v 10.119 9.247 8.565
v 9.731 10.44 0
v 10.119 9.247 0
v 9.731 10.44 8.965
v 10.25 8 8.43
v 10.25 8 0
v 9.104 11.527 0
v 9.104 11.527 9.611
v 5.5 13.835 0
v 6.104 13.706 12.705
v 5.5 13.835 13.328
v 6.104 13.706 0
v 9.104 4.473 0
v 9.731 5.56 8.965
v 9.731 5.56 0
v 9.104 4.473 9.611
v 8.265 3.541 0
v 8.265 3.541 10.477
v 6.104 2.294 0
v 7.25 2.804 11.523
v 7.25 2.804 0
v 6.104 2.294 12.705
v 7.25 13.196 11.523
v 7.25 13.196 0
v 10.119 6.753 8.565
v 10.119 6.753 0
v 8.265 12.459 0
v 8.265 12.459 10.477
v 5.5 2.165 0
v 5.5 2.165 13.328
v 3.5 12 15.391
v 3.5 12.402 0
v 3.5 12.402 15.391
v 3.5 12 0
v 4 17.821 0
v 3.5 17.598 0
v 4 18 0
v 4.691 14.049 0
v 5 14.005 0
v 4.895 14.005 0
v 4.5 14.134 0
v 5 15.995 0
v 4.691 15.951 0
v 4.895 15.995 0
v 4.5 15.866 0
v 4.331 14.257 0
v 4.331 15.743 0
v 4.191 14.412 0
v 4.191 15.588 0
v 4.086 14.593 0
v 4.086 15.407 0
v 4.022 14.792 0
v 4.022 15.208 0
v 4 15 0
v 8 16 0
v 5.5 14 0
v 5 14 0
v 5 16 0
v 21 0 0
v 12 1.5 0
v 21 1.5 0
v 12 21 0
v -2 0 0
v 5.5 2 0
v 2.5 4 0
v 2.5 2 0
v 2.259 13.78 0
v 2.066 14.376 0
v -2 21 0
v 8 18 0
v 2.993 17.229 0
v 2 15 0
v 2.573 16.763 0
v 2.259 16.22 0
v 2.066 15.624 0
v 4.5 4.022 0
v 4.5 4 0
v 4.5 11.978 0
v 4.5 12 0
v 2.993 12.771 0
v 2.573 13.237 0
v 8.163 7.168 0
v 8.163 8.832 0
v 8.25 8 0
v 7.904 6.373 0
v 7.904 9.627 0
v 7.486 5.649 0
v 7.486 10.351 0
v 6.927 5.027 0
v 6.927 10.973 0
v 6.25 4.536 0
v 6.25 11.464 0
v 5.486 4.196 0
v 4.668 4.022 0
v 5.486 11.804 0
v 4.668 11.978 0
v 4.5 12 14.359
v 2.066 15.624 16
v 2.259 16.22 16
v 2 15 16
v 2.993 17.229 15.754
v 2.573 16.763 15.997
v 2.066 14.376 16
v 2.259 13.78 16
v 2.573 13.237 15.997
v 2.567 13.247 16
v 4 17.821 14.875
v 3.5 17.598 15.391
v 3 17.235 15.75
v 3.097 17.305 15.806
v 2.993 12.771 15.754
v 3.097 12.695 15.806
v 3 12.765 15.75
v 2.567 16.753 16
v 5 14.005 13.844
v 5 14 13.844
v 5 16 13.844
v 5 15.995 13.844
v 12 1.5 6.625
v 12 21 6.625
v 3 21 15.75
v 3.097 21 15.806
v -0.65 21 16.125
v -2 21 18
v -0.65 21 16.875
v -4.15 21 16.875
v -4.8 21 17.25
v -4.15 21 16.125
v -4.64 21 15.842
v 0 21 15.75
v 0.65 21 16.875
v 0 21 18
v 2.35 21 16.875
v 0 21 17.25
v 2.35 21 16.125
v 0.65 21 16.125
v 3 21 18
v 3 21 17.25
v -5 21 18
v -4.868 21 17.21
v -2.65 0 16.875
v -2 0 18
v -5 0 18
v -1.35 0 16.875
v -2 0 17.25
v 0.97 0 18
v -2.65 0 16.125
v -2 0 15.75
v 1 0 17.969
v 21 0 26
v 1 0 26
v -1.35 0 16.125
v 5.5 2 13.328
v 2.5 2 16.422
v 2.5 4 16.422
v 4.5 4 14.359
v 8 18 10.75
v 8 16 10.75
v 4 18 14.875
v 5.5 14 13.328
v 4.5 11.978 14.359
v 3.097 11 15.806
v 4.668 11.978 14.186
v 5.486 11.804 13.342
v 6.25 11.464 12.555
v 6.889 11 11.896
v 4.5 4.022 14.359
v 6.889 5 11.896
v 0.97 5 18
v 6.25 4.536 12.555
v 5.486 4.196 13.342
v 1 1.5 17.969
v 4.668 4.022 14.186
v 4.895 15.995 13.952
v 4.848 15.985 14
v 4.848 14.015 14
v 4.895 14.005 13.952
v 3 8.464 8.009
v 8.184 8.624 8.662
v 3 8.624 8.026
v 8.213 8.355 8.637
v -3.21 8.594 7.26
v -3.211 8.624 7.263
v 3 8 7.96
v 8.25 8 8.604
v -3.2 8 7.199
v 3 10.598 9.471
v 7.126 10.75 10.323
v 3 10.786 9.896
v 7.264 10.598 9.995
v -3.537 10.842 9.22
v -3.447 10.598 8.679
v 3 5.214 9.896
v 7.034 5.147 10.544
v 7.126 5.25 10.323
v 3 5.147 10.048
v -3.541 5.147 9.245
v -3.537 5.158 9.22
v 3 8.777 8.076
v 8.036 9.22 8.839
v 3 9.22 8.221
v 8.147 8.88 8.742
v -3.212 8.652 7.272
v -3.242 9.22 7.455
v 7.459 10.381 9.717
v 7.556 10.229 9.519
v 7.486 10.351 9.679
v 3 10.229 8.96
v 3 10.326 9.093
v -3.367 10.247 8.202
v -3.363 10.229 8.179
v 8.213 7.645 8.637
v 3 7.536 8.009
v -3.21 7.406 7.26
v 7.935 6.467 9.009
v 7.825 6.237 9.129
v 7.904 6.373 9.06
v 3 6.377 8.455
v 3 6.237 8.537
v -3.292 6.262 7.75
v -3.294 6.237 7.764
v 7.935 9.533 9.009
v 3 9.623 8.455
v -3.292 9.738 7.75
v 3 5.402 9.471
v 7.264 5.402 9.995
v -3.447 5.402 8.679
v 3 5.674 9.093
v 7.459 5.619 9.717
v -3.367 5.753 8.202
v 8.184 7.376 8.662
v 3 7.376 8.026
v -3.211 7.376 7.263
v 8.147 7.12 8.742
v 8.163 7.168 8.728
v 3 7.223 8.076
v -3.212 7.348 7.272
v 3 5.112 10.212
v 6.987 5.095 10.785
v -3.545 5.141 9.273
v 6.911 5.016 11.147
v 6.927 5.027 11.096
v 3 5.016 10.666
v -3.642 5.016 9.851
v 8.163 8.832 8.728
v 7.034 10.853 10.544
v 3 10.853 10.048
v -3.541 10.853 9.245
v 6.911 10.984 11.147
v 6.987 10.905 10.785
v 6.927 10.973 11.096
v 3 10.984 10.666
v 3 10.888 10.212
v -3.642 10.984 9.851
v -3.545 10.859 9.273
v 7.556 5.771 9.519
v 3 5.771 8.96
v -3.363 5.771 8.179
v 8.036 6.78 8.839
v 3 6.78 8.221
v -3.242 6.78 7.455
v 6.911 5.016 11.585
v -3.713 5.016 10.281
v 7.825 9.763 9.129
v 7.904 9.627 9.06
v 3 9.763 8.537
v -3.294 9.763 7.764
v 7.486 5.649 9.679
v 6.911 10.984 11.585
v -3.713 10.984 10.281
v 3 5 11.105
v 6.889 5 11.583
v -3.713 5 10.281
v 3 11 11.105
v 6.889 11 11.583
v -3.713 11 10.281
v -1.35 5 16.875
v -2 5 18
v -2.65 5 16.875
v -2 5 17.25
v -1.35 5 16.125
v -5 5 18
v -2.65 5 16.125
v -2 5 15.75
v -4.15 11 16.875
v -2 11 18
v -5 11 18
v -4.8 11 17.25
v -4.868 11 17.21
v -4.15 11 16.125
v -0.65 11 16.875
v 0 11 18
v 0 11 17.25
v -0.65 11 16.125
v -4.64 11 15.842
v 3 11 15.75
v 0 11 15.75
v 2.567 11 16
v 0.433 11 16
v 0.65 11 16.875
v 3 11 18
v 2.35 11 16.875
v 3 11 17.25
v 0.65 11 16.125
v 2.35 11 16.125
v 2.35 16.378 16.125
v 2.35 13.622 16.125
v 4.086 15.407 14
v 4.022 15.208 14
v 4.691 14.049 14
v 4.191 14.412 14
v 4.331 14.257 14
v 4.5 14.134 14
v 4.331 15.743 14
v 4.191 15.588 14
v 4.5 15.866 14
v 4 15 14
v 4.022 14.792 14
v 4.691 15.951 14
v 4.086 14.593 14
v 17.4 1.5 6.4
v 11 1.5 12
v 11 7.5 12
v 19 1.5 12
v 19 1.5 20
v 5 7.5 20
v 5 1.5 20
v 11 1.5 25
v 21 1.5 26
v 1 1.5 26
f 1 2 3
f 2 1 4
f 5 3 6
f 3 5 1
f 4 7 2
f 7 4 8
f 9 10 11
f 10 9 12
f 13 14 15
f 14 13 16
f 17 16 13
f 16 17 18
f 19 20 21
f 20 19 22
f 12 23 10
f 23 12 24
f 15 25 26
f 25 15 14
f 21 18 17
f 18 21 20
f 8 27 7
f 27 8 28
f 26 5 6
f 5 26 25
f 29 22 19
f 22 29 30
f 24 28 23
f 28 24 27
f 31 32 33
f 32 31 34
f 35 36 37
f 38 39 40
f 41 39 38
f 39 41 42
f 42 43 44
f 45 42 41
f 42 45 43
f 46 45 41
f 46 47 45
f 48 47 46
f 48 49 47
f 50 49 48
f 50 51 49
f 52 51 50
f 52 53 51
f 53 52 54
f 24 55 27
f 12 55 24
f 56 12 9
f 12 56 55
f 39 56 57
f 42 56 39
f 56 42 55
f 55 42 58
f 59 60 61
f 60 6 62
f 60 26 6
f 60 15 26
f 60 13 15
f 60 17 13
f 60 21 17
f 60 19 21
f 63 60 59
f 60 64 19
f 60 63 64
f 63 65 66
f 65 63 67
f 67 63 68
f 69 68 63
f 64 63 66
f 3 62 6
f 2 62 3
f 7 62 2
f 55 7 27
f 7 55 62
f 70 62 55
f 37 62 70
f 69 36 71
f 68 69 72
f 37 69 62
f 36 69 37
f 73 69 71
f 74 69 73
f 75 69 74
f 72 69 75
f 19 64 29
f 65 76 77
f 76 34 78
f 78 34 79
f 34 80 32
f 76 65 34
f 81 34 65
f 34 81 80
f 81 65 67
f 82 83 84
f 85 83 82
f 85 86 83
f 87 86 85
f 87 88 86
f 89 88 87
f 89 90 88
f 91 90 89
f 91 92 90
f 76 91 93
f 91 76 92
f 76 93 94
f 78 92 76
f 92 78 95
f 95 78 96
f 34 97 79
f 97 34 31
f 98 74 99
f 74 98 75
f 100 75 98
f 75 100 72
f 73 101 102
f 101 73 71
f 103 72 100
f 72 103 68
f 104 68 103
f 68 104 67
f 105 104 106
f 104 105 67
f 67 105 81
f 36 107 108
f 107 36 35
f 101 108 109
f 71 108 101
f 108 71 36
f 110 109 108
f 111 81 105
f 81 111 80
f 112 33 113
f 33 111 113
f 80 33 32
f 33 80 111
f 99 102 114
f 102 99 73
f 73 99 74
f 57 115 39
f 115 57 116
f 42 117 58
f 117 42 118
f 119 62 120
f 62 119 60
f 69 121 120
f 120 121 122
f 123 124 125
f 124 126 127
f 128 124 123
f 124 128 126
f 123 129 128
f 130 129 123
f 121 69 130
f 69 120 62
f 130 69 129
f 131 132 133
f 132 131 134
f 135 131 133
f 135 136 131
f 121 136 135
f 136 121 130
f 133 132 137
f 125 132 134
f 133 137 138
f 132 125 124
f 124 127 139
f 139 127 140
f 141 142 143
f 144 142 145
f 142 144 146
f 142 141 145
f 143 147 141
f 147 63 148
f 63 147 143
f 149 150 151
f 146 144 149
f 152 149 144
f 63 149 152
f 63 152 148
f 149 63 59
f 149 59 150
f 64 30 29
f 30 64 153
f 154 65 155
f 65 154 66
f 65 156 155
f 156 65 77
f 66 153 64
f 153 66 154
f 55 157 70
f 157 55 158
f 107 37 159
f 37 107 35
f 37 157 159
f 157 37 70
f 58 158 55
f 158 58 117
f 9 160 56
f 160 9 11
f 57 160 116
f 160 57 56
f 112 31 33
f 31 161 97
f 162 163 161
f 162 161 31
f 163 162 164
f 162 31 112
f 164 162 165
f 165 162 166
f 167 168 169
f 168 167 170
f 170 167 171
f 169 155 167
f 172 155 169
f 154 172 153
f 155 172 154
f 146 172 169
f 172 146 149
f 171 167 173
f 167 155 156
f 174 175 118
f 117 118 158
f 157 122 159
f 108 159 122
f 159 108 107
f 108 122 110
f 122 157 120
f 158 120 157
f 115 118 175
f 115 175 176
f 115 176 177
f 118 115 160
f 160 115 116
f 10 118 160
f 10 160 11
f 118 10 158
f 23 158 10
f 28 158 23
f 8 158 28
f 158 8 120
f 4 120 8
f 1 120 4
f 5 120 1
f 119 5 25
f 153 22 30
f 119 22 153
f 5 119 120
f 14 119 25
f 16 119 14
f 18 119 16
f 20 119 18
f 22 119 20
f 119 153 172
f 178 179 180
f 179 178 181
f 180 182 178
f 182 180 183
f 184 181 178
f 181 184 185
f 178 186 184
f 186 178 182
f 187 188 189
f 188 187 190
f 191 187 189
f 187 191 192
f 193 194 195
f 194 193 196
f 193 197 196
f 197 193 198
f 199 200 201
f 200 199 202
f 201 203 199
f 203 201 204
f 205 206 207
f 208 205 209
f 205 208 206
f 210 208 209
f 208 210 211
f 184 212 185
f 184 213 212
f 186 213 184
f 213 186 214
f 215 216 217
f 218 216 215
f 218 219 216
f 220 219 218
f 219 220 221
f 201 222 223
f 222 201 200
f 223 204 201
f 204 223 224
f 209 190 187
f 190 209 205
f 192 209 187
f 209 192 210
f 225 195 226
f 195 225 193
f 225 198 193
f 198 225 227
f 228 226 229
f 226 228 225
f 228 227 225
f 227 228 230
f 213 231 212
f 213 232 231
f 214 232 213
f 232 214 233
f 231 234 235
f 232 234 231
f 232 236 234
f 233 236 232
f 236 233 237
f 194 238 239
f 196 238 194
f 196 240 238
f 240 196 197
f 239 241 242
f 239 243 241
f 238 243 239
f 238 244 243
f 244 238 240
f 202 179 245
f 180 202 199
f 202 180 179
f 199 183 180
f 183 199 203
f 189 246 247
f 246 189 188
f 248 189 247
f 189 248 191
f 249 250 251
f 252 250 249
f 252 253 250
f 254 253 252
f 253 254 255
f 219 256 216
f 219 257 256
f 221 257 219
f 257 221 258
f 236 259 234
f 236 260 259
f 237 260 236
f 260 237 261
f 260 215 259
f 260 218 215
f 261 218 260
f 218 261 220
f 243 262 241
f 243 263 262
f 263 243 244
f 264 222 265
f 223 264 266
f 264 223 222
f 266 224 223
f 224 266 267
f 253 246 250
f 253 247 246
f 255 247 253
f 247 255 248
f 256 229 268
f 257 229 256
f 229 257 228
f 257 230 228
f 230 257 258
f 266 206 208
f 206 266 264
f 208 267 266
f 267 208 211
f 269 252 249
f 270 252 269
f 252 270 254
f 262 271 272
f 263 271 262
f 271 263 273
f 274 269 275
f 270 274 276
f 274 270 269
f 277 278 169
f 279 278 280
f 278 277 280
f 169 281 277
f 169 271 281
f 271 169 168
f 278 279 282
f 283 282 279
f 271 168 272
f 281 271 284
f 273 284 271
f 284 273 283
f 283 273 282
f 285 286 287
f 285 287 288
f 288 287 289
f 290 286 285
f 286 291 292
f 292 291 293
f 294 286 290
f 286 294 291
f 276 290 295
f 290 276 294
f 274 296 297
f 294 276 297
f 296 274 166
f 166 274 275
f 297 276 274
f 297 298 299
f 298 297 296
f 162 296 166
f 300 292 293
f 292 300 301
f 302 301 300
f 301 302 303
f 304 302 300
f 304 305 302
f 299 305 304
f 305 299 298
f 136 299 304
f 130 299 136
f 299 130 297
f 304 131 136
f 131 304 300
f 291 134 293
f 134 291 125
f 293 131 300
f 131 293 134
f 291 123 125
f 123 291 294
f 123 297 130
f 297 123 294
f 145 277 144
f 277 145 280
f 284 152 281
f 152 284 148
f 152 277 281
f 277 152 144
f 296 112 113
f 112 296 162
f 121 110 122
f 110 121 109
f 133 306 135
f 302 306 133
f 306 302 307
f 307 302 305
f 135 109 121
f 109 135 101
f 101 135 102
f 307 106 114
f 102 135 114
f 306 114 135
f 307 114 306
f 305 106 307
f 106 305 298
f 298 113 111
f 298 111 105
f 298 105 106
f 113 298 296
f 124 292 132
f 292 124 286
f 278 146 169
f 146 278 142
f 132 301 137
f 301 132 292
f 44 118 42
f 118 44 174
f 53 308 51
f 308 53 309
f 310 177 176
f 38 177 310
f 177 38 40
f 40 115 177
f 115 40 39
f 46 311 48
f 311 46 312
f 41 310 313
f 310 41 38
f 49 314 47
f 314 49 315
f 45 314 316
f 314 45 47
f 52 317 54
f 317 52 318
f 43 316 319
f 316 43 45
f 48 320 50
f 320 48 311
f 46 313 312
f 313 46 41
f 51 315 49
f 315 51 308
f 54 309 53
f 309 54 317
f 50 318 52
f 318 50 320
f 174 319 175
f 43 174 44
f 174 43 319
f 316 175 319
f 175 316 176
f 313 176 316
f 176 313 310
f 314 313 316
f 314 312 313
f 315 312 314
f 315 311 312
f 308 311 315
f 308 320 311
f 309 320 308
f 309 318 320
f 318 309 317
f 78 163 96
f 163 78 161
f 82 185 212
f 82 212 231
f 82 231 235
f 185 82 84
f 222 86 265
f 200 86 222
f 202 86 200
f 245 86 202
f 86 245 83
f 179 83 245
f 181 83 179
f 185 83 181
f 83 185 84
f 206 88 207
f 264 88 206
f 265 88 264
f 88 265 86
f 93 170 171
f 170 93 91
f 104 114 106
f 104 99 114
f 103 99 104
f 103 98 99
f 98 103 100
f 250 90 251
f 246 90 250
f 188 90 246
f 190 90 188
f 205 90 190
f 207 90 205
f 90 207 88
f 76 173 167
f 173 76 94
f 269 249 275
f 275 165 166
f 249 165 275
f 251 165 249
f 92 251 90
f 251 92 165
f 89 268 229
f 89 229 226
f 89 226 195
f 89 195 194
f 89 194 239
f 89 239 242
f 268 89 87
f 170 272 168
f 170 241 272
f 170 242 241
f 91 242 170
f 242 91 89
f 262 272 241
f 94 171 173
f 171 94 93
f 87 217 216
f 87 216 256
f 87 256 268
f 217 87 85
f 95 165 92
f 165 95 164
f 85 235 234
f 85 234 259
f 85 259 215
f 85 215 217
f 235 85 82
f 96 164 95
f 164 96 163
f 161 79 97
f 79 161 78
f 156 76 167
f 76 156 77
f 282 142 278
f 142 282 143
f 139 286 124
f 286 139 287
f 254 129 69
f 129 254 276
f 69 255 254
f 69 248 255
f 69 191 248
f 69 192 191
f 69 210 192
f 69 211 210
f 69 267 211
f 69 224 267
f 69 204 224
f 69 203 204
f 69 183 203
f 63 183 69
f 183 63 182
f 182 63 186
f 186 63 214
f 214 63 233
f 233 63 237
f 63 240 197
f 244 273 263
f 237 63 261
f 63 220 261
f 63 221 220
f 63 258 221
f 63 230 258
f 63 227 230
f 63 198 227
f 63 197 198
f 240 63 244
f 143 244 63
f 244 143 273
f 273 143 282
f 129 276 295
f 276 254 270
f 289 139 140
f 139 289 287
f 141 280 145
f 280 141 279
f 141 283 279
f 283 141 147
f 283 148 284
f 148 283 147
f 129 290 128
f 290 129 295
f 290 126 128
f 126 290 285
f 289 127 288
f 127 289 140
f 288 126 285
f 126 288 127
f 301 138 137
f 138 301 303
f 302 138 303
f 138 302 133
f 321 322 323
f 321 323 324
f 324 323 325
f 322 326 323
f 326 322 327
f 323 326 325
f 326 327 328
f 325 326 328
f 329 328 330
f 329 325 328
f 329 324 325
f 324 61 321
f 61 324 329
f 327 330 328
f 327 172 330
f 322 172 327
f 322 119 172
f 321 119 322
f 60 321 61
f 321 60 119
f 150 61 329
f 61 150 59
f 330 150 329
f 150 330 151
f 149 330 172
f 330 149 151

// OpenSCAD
// band width[mm]
nauhanleveys = 24; // [24:1:39]
// underplate width[mm] 
alalevyn_leveys =26; // [26:1:39]
//underplate legth[mm]
alalevyn_pituus =20; // [18:1:39]

$fn = 30;

CubePoints = [  // viiste
  [  0,  -1,  19 ],  //0
  [ 32,  -1,  -14 ],  //1
  [ 32,  25,  -14 ],  //2
  [  0,  25,  19 ],  //3
  [  0,  -1,  50 ],  //4
  [ 32,  -1,  50 ],  //5
  [ 32,  25,  50 ],  //6
  [  0,  25,  50 ]]; //7
  
CubeFaces = [
  [0,1,2,3],  // bottom
  [4,5,1,0],  // front
  [7,6,5,4],  // top
  [5,6,2,1],  // right
  [6,7,3,2],  // back
  [7,4,0,3]]; // left
  
 

  difference(){
translate([-2,0,0])
cube([16+nauhanleveys/3-10,21,25],false); //alkupalikka
      
translate([2.5,2,0]) // alinrako
cube([5+nauhanleveys/3-10,2,25],false);      
      
translate([4,16,0]) // ylinrako
cube([6+nauhanleveys/3-10,2,25],false);      
      
translate([5,12,0]) // 2. ylinrako
cube([2.5+nauhanleveys/3-10,2,25],false);

intersection(){
difference(){
translate([6.25+nauhanleveys/3-10,8,7.5])
cylinder(h=25, r=6, center=true);
translate([0,12,0])
cube([3.5,4,20],false);}  
   
translate([5+nauhanleveys/3-10,0,0])
cube([25,25,25],false);    }     
    
intersection(){ 
translate([5,15,7.5])
cylinder(h=25, r=3, center=true); 
cube([5,25,25],false);}  
      
polyhedron( CubePoints, CubeFaces );

suuaukkoreika();
suuaukkoreika1();
suuaukkocube();
ohjainreika();
alaohjainreika();
ura2();

translate([-3,-1,18]) 
cube([14,26,15],false); //reunan tasaus
  }
  

  difference(){
translate([5,15,7.5]) //yläkielekkeen pyöristys
cylinder(h=15, r=1, center=true); 
     polyhedron( CubePoints, CubeFaces );
translate([-1,-1,14]) 
cube([25,25,15],false);
  } 

 difference(){  
translate([5,14,0]) // yläkieleke
cube([3,2,15],false);
     polyhedron( CubePoints, CubeFaces );
  }

  difference(){ 
translate([6.25+nauhanleveys/3-10,8,8])
cylinder(h=16, r=4, center=true);
    polyhedron( CubePoints, CubeFaces );
suuaukkoreika();
suuaukkoreika1();
suuaukkocube();
ohjainreika();
alaohjainreika();
ura2();
  }  
 
  difference(){
translate([2,4,0])  
cube([4.5+nauhanleveys/3-10,8,25],false); //keskipalikka
      polyhedron( CubePoints, CubeFaces );
suuaukkoreika();
suuaukkoreika1();      
suuaukkocube();
ohjainreika();
alaohjainreika();
ura2();
  }
  
  difference(){
lisake();
suuaukkoreika();
suuaukkoreika1();      
suuaukkocube();
ohjainreika();
alaohjainreika();
ura();
  }

module lisake(){
    Pointsit = [
  [  -2,  0,  18 ],  //0
  [ -2,  21,  18 ],  //1
  [ -5,  21,  18 ],  //2
  [  -5,  0,  18 ],  //3
  [ -2,  21,  0 ],  //4
  [ -2,  0,  0 ]];  //5
  
  Naamat = [
  [3,2,1,0],  // bottom
  [1,4,5,0],  // front
  [3,5,4,2],  //back
  [4,1,2], // left
  [0,5,3]]; // right
    
 polyhedron(Pointsit, Naamat );}
 
  
module suuaukkoreika(){
    rotate([90,90,90])
translate([-10+nauhanleveys/3-10,8,-5])
cylinder(h=30, r=3, center=false);}

module suuaukkocube(){
translate([-6,5,8-(nauhanleveys/3-10)]) // suuaukkocube
     rotate([0,-7,0])   
cube([118,6,15],false); }

module ohjainreika(){
    $fn = 6;
       rotate([90,0,0])
translate([0,16.5,-35])
    rotate([0,0,30])
cylinder(h=25, r=0.75, center=false);} 

module alaohjainreika(){
    $fn = 6;
       rotate([90,0,0])
translate([-2,16.5,-10])
    rotate([0,0,30])
cylinder(h=25, r=0.75, center=false);} 



module suuaukkoreika1(){
    rotate([90,90,90])
translate([-8+nauhanleveys/3-10,8,-5])
    rotate([0,-7,0])
cylinder(h=30, r=3, center=false);}

module ura(){
    $fn = 6;
       rotate([90,0,0])
translate([-4.8,16.5,-35])
    rotate([0,0,30])
cylinder(h=25, r=0.75, center=false);} 

module pidike(){
    translate([0,11,16]) 
     rotate([0,0,0])   
cube([3,10,2],false); }

module ura2(){
    $fn = 6;
       rotate([90,0,0])
translate([3,16.5,-35])
    rotate([0,0,30])
cylinder(h=25, r=0.75, center=false);} 

difference(){
pidike();
ohjainreika();
ura2();}

    translate([1,0,0]) 
     rotate([0,0,0])   
cube([alalevyn_pituus,1.5,alalevyn_leveys],false); 

module tarjotin(){
    Pointsit1 = [
  [  11,  1.5,  12 ],  //0
  [ 11,  7.5,  12 ],  //1
  [ 19, 1.5,  12 ],  //2
  [ 19,  1.5,  12 ],  //3
  [ 19,  0,  5 ],  //4
  [ 19,  0,  5 ]];  //5
  
  Naamat1 = [
  [3,2,1,0],  // bottom
  [1,4,5,0],  // front
  [3,5,4,2],  //back
  [4,1,2], // left
  [0,5,3]]; // right
    
 polyhedron(Pointsit1, Naamat1 );}
 
 module tarjotin3(){
    Pointsit2 = [
  [  5,  1.5,  20 ],  //0
  [ 5,  7.5,  20 ],  //1
  [ 11, 1.5,  25 ],  //2
  [ 11,  1.5,  25 ],  //3
  [ 19,  1.5,  20 ],  //4
  [ 19,  1.5,  20 ]];  //5
  
  Naamat2 = [
  [3,2,1,0],  // bottom
  [1,4,5,0],  // front
  [3,5,4,2],  //back
  [4,1,2], // left
  [0,5,3]]; // right
    
 polyhedron(Pointsit2, Naamat2 );}
 
 CubePoints1 = [  // tarjotin2
  [  11,  0,  12 ],  //0
  [ 19,  0,  12 ],  //1
  [ 19,  1.5,  12 ],  //2
  [  11,  7.5,  12 ],  //3
  [  5,  0,  20 ],  //4
  [ 19,  0,  20 ],  //5
  [ 19,  1.5,  20 ],  //6
  [  5,  7.5,  20 ]]; //7
  
CubeFaces1 = [
  [0,1,2,3],  // bottom
  [4,5,1,0],  // front
  [7,6,5,4],  // top
  [5,6,2,1],  // right
  [6,7,3,2],  // back
  [7,4,0,3]]; // left

rotate([0,0,0]){   
tarjotin();
polyhedron( CubePoints1, CubeFaces1 );
tarjotin3();}
